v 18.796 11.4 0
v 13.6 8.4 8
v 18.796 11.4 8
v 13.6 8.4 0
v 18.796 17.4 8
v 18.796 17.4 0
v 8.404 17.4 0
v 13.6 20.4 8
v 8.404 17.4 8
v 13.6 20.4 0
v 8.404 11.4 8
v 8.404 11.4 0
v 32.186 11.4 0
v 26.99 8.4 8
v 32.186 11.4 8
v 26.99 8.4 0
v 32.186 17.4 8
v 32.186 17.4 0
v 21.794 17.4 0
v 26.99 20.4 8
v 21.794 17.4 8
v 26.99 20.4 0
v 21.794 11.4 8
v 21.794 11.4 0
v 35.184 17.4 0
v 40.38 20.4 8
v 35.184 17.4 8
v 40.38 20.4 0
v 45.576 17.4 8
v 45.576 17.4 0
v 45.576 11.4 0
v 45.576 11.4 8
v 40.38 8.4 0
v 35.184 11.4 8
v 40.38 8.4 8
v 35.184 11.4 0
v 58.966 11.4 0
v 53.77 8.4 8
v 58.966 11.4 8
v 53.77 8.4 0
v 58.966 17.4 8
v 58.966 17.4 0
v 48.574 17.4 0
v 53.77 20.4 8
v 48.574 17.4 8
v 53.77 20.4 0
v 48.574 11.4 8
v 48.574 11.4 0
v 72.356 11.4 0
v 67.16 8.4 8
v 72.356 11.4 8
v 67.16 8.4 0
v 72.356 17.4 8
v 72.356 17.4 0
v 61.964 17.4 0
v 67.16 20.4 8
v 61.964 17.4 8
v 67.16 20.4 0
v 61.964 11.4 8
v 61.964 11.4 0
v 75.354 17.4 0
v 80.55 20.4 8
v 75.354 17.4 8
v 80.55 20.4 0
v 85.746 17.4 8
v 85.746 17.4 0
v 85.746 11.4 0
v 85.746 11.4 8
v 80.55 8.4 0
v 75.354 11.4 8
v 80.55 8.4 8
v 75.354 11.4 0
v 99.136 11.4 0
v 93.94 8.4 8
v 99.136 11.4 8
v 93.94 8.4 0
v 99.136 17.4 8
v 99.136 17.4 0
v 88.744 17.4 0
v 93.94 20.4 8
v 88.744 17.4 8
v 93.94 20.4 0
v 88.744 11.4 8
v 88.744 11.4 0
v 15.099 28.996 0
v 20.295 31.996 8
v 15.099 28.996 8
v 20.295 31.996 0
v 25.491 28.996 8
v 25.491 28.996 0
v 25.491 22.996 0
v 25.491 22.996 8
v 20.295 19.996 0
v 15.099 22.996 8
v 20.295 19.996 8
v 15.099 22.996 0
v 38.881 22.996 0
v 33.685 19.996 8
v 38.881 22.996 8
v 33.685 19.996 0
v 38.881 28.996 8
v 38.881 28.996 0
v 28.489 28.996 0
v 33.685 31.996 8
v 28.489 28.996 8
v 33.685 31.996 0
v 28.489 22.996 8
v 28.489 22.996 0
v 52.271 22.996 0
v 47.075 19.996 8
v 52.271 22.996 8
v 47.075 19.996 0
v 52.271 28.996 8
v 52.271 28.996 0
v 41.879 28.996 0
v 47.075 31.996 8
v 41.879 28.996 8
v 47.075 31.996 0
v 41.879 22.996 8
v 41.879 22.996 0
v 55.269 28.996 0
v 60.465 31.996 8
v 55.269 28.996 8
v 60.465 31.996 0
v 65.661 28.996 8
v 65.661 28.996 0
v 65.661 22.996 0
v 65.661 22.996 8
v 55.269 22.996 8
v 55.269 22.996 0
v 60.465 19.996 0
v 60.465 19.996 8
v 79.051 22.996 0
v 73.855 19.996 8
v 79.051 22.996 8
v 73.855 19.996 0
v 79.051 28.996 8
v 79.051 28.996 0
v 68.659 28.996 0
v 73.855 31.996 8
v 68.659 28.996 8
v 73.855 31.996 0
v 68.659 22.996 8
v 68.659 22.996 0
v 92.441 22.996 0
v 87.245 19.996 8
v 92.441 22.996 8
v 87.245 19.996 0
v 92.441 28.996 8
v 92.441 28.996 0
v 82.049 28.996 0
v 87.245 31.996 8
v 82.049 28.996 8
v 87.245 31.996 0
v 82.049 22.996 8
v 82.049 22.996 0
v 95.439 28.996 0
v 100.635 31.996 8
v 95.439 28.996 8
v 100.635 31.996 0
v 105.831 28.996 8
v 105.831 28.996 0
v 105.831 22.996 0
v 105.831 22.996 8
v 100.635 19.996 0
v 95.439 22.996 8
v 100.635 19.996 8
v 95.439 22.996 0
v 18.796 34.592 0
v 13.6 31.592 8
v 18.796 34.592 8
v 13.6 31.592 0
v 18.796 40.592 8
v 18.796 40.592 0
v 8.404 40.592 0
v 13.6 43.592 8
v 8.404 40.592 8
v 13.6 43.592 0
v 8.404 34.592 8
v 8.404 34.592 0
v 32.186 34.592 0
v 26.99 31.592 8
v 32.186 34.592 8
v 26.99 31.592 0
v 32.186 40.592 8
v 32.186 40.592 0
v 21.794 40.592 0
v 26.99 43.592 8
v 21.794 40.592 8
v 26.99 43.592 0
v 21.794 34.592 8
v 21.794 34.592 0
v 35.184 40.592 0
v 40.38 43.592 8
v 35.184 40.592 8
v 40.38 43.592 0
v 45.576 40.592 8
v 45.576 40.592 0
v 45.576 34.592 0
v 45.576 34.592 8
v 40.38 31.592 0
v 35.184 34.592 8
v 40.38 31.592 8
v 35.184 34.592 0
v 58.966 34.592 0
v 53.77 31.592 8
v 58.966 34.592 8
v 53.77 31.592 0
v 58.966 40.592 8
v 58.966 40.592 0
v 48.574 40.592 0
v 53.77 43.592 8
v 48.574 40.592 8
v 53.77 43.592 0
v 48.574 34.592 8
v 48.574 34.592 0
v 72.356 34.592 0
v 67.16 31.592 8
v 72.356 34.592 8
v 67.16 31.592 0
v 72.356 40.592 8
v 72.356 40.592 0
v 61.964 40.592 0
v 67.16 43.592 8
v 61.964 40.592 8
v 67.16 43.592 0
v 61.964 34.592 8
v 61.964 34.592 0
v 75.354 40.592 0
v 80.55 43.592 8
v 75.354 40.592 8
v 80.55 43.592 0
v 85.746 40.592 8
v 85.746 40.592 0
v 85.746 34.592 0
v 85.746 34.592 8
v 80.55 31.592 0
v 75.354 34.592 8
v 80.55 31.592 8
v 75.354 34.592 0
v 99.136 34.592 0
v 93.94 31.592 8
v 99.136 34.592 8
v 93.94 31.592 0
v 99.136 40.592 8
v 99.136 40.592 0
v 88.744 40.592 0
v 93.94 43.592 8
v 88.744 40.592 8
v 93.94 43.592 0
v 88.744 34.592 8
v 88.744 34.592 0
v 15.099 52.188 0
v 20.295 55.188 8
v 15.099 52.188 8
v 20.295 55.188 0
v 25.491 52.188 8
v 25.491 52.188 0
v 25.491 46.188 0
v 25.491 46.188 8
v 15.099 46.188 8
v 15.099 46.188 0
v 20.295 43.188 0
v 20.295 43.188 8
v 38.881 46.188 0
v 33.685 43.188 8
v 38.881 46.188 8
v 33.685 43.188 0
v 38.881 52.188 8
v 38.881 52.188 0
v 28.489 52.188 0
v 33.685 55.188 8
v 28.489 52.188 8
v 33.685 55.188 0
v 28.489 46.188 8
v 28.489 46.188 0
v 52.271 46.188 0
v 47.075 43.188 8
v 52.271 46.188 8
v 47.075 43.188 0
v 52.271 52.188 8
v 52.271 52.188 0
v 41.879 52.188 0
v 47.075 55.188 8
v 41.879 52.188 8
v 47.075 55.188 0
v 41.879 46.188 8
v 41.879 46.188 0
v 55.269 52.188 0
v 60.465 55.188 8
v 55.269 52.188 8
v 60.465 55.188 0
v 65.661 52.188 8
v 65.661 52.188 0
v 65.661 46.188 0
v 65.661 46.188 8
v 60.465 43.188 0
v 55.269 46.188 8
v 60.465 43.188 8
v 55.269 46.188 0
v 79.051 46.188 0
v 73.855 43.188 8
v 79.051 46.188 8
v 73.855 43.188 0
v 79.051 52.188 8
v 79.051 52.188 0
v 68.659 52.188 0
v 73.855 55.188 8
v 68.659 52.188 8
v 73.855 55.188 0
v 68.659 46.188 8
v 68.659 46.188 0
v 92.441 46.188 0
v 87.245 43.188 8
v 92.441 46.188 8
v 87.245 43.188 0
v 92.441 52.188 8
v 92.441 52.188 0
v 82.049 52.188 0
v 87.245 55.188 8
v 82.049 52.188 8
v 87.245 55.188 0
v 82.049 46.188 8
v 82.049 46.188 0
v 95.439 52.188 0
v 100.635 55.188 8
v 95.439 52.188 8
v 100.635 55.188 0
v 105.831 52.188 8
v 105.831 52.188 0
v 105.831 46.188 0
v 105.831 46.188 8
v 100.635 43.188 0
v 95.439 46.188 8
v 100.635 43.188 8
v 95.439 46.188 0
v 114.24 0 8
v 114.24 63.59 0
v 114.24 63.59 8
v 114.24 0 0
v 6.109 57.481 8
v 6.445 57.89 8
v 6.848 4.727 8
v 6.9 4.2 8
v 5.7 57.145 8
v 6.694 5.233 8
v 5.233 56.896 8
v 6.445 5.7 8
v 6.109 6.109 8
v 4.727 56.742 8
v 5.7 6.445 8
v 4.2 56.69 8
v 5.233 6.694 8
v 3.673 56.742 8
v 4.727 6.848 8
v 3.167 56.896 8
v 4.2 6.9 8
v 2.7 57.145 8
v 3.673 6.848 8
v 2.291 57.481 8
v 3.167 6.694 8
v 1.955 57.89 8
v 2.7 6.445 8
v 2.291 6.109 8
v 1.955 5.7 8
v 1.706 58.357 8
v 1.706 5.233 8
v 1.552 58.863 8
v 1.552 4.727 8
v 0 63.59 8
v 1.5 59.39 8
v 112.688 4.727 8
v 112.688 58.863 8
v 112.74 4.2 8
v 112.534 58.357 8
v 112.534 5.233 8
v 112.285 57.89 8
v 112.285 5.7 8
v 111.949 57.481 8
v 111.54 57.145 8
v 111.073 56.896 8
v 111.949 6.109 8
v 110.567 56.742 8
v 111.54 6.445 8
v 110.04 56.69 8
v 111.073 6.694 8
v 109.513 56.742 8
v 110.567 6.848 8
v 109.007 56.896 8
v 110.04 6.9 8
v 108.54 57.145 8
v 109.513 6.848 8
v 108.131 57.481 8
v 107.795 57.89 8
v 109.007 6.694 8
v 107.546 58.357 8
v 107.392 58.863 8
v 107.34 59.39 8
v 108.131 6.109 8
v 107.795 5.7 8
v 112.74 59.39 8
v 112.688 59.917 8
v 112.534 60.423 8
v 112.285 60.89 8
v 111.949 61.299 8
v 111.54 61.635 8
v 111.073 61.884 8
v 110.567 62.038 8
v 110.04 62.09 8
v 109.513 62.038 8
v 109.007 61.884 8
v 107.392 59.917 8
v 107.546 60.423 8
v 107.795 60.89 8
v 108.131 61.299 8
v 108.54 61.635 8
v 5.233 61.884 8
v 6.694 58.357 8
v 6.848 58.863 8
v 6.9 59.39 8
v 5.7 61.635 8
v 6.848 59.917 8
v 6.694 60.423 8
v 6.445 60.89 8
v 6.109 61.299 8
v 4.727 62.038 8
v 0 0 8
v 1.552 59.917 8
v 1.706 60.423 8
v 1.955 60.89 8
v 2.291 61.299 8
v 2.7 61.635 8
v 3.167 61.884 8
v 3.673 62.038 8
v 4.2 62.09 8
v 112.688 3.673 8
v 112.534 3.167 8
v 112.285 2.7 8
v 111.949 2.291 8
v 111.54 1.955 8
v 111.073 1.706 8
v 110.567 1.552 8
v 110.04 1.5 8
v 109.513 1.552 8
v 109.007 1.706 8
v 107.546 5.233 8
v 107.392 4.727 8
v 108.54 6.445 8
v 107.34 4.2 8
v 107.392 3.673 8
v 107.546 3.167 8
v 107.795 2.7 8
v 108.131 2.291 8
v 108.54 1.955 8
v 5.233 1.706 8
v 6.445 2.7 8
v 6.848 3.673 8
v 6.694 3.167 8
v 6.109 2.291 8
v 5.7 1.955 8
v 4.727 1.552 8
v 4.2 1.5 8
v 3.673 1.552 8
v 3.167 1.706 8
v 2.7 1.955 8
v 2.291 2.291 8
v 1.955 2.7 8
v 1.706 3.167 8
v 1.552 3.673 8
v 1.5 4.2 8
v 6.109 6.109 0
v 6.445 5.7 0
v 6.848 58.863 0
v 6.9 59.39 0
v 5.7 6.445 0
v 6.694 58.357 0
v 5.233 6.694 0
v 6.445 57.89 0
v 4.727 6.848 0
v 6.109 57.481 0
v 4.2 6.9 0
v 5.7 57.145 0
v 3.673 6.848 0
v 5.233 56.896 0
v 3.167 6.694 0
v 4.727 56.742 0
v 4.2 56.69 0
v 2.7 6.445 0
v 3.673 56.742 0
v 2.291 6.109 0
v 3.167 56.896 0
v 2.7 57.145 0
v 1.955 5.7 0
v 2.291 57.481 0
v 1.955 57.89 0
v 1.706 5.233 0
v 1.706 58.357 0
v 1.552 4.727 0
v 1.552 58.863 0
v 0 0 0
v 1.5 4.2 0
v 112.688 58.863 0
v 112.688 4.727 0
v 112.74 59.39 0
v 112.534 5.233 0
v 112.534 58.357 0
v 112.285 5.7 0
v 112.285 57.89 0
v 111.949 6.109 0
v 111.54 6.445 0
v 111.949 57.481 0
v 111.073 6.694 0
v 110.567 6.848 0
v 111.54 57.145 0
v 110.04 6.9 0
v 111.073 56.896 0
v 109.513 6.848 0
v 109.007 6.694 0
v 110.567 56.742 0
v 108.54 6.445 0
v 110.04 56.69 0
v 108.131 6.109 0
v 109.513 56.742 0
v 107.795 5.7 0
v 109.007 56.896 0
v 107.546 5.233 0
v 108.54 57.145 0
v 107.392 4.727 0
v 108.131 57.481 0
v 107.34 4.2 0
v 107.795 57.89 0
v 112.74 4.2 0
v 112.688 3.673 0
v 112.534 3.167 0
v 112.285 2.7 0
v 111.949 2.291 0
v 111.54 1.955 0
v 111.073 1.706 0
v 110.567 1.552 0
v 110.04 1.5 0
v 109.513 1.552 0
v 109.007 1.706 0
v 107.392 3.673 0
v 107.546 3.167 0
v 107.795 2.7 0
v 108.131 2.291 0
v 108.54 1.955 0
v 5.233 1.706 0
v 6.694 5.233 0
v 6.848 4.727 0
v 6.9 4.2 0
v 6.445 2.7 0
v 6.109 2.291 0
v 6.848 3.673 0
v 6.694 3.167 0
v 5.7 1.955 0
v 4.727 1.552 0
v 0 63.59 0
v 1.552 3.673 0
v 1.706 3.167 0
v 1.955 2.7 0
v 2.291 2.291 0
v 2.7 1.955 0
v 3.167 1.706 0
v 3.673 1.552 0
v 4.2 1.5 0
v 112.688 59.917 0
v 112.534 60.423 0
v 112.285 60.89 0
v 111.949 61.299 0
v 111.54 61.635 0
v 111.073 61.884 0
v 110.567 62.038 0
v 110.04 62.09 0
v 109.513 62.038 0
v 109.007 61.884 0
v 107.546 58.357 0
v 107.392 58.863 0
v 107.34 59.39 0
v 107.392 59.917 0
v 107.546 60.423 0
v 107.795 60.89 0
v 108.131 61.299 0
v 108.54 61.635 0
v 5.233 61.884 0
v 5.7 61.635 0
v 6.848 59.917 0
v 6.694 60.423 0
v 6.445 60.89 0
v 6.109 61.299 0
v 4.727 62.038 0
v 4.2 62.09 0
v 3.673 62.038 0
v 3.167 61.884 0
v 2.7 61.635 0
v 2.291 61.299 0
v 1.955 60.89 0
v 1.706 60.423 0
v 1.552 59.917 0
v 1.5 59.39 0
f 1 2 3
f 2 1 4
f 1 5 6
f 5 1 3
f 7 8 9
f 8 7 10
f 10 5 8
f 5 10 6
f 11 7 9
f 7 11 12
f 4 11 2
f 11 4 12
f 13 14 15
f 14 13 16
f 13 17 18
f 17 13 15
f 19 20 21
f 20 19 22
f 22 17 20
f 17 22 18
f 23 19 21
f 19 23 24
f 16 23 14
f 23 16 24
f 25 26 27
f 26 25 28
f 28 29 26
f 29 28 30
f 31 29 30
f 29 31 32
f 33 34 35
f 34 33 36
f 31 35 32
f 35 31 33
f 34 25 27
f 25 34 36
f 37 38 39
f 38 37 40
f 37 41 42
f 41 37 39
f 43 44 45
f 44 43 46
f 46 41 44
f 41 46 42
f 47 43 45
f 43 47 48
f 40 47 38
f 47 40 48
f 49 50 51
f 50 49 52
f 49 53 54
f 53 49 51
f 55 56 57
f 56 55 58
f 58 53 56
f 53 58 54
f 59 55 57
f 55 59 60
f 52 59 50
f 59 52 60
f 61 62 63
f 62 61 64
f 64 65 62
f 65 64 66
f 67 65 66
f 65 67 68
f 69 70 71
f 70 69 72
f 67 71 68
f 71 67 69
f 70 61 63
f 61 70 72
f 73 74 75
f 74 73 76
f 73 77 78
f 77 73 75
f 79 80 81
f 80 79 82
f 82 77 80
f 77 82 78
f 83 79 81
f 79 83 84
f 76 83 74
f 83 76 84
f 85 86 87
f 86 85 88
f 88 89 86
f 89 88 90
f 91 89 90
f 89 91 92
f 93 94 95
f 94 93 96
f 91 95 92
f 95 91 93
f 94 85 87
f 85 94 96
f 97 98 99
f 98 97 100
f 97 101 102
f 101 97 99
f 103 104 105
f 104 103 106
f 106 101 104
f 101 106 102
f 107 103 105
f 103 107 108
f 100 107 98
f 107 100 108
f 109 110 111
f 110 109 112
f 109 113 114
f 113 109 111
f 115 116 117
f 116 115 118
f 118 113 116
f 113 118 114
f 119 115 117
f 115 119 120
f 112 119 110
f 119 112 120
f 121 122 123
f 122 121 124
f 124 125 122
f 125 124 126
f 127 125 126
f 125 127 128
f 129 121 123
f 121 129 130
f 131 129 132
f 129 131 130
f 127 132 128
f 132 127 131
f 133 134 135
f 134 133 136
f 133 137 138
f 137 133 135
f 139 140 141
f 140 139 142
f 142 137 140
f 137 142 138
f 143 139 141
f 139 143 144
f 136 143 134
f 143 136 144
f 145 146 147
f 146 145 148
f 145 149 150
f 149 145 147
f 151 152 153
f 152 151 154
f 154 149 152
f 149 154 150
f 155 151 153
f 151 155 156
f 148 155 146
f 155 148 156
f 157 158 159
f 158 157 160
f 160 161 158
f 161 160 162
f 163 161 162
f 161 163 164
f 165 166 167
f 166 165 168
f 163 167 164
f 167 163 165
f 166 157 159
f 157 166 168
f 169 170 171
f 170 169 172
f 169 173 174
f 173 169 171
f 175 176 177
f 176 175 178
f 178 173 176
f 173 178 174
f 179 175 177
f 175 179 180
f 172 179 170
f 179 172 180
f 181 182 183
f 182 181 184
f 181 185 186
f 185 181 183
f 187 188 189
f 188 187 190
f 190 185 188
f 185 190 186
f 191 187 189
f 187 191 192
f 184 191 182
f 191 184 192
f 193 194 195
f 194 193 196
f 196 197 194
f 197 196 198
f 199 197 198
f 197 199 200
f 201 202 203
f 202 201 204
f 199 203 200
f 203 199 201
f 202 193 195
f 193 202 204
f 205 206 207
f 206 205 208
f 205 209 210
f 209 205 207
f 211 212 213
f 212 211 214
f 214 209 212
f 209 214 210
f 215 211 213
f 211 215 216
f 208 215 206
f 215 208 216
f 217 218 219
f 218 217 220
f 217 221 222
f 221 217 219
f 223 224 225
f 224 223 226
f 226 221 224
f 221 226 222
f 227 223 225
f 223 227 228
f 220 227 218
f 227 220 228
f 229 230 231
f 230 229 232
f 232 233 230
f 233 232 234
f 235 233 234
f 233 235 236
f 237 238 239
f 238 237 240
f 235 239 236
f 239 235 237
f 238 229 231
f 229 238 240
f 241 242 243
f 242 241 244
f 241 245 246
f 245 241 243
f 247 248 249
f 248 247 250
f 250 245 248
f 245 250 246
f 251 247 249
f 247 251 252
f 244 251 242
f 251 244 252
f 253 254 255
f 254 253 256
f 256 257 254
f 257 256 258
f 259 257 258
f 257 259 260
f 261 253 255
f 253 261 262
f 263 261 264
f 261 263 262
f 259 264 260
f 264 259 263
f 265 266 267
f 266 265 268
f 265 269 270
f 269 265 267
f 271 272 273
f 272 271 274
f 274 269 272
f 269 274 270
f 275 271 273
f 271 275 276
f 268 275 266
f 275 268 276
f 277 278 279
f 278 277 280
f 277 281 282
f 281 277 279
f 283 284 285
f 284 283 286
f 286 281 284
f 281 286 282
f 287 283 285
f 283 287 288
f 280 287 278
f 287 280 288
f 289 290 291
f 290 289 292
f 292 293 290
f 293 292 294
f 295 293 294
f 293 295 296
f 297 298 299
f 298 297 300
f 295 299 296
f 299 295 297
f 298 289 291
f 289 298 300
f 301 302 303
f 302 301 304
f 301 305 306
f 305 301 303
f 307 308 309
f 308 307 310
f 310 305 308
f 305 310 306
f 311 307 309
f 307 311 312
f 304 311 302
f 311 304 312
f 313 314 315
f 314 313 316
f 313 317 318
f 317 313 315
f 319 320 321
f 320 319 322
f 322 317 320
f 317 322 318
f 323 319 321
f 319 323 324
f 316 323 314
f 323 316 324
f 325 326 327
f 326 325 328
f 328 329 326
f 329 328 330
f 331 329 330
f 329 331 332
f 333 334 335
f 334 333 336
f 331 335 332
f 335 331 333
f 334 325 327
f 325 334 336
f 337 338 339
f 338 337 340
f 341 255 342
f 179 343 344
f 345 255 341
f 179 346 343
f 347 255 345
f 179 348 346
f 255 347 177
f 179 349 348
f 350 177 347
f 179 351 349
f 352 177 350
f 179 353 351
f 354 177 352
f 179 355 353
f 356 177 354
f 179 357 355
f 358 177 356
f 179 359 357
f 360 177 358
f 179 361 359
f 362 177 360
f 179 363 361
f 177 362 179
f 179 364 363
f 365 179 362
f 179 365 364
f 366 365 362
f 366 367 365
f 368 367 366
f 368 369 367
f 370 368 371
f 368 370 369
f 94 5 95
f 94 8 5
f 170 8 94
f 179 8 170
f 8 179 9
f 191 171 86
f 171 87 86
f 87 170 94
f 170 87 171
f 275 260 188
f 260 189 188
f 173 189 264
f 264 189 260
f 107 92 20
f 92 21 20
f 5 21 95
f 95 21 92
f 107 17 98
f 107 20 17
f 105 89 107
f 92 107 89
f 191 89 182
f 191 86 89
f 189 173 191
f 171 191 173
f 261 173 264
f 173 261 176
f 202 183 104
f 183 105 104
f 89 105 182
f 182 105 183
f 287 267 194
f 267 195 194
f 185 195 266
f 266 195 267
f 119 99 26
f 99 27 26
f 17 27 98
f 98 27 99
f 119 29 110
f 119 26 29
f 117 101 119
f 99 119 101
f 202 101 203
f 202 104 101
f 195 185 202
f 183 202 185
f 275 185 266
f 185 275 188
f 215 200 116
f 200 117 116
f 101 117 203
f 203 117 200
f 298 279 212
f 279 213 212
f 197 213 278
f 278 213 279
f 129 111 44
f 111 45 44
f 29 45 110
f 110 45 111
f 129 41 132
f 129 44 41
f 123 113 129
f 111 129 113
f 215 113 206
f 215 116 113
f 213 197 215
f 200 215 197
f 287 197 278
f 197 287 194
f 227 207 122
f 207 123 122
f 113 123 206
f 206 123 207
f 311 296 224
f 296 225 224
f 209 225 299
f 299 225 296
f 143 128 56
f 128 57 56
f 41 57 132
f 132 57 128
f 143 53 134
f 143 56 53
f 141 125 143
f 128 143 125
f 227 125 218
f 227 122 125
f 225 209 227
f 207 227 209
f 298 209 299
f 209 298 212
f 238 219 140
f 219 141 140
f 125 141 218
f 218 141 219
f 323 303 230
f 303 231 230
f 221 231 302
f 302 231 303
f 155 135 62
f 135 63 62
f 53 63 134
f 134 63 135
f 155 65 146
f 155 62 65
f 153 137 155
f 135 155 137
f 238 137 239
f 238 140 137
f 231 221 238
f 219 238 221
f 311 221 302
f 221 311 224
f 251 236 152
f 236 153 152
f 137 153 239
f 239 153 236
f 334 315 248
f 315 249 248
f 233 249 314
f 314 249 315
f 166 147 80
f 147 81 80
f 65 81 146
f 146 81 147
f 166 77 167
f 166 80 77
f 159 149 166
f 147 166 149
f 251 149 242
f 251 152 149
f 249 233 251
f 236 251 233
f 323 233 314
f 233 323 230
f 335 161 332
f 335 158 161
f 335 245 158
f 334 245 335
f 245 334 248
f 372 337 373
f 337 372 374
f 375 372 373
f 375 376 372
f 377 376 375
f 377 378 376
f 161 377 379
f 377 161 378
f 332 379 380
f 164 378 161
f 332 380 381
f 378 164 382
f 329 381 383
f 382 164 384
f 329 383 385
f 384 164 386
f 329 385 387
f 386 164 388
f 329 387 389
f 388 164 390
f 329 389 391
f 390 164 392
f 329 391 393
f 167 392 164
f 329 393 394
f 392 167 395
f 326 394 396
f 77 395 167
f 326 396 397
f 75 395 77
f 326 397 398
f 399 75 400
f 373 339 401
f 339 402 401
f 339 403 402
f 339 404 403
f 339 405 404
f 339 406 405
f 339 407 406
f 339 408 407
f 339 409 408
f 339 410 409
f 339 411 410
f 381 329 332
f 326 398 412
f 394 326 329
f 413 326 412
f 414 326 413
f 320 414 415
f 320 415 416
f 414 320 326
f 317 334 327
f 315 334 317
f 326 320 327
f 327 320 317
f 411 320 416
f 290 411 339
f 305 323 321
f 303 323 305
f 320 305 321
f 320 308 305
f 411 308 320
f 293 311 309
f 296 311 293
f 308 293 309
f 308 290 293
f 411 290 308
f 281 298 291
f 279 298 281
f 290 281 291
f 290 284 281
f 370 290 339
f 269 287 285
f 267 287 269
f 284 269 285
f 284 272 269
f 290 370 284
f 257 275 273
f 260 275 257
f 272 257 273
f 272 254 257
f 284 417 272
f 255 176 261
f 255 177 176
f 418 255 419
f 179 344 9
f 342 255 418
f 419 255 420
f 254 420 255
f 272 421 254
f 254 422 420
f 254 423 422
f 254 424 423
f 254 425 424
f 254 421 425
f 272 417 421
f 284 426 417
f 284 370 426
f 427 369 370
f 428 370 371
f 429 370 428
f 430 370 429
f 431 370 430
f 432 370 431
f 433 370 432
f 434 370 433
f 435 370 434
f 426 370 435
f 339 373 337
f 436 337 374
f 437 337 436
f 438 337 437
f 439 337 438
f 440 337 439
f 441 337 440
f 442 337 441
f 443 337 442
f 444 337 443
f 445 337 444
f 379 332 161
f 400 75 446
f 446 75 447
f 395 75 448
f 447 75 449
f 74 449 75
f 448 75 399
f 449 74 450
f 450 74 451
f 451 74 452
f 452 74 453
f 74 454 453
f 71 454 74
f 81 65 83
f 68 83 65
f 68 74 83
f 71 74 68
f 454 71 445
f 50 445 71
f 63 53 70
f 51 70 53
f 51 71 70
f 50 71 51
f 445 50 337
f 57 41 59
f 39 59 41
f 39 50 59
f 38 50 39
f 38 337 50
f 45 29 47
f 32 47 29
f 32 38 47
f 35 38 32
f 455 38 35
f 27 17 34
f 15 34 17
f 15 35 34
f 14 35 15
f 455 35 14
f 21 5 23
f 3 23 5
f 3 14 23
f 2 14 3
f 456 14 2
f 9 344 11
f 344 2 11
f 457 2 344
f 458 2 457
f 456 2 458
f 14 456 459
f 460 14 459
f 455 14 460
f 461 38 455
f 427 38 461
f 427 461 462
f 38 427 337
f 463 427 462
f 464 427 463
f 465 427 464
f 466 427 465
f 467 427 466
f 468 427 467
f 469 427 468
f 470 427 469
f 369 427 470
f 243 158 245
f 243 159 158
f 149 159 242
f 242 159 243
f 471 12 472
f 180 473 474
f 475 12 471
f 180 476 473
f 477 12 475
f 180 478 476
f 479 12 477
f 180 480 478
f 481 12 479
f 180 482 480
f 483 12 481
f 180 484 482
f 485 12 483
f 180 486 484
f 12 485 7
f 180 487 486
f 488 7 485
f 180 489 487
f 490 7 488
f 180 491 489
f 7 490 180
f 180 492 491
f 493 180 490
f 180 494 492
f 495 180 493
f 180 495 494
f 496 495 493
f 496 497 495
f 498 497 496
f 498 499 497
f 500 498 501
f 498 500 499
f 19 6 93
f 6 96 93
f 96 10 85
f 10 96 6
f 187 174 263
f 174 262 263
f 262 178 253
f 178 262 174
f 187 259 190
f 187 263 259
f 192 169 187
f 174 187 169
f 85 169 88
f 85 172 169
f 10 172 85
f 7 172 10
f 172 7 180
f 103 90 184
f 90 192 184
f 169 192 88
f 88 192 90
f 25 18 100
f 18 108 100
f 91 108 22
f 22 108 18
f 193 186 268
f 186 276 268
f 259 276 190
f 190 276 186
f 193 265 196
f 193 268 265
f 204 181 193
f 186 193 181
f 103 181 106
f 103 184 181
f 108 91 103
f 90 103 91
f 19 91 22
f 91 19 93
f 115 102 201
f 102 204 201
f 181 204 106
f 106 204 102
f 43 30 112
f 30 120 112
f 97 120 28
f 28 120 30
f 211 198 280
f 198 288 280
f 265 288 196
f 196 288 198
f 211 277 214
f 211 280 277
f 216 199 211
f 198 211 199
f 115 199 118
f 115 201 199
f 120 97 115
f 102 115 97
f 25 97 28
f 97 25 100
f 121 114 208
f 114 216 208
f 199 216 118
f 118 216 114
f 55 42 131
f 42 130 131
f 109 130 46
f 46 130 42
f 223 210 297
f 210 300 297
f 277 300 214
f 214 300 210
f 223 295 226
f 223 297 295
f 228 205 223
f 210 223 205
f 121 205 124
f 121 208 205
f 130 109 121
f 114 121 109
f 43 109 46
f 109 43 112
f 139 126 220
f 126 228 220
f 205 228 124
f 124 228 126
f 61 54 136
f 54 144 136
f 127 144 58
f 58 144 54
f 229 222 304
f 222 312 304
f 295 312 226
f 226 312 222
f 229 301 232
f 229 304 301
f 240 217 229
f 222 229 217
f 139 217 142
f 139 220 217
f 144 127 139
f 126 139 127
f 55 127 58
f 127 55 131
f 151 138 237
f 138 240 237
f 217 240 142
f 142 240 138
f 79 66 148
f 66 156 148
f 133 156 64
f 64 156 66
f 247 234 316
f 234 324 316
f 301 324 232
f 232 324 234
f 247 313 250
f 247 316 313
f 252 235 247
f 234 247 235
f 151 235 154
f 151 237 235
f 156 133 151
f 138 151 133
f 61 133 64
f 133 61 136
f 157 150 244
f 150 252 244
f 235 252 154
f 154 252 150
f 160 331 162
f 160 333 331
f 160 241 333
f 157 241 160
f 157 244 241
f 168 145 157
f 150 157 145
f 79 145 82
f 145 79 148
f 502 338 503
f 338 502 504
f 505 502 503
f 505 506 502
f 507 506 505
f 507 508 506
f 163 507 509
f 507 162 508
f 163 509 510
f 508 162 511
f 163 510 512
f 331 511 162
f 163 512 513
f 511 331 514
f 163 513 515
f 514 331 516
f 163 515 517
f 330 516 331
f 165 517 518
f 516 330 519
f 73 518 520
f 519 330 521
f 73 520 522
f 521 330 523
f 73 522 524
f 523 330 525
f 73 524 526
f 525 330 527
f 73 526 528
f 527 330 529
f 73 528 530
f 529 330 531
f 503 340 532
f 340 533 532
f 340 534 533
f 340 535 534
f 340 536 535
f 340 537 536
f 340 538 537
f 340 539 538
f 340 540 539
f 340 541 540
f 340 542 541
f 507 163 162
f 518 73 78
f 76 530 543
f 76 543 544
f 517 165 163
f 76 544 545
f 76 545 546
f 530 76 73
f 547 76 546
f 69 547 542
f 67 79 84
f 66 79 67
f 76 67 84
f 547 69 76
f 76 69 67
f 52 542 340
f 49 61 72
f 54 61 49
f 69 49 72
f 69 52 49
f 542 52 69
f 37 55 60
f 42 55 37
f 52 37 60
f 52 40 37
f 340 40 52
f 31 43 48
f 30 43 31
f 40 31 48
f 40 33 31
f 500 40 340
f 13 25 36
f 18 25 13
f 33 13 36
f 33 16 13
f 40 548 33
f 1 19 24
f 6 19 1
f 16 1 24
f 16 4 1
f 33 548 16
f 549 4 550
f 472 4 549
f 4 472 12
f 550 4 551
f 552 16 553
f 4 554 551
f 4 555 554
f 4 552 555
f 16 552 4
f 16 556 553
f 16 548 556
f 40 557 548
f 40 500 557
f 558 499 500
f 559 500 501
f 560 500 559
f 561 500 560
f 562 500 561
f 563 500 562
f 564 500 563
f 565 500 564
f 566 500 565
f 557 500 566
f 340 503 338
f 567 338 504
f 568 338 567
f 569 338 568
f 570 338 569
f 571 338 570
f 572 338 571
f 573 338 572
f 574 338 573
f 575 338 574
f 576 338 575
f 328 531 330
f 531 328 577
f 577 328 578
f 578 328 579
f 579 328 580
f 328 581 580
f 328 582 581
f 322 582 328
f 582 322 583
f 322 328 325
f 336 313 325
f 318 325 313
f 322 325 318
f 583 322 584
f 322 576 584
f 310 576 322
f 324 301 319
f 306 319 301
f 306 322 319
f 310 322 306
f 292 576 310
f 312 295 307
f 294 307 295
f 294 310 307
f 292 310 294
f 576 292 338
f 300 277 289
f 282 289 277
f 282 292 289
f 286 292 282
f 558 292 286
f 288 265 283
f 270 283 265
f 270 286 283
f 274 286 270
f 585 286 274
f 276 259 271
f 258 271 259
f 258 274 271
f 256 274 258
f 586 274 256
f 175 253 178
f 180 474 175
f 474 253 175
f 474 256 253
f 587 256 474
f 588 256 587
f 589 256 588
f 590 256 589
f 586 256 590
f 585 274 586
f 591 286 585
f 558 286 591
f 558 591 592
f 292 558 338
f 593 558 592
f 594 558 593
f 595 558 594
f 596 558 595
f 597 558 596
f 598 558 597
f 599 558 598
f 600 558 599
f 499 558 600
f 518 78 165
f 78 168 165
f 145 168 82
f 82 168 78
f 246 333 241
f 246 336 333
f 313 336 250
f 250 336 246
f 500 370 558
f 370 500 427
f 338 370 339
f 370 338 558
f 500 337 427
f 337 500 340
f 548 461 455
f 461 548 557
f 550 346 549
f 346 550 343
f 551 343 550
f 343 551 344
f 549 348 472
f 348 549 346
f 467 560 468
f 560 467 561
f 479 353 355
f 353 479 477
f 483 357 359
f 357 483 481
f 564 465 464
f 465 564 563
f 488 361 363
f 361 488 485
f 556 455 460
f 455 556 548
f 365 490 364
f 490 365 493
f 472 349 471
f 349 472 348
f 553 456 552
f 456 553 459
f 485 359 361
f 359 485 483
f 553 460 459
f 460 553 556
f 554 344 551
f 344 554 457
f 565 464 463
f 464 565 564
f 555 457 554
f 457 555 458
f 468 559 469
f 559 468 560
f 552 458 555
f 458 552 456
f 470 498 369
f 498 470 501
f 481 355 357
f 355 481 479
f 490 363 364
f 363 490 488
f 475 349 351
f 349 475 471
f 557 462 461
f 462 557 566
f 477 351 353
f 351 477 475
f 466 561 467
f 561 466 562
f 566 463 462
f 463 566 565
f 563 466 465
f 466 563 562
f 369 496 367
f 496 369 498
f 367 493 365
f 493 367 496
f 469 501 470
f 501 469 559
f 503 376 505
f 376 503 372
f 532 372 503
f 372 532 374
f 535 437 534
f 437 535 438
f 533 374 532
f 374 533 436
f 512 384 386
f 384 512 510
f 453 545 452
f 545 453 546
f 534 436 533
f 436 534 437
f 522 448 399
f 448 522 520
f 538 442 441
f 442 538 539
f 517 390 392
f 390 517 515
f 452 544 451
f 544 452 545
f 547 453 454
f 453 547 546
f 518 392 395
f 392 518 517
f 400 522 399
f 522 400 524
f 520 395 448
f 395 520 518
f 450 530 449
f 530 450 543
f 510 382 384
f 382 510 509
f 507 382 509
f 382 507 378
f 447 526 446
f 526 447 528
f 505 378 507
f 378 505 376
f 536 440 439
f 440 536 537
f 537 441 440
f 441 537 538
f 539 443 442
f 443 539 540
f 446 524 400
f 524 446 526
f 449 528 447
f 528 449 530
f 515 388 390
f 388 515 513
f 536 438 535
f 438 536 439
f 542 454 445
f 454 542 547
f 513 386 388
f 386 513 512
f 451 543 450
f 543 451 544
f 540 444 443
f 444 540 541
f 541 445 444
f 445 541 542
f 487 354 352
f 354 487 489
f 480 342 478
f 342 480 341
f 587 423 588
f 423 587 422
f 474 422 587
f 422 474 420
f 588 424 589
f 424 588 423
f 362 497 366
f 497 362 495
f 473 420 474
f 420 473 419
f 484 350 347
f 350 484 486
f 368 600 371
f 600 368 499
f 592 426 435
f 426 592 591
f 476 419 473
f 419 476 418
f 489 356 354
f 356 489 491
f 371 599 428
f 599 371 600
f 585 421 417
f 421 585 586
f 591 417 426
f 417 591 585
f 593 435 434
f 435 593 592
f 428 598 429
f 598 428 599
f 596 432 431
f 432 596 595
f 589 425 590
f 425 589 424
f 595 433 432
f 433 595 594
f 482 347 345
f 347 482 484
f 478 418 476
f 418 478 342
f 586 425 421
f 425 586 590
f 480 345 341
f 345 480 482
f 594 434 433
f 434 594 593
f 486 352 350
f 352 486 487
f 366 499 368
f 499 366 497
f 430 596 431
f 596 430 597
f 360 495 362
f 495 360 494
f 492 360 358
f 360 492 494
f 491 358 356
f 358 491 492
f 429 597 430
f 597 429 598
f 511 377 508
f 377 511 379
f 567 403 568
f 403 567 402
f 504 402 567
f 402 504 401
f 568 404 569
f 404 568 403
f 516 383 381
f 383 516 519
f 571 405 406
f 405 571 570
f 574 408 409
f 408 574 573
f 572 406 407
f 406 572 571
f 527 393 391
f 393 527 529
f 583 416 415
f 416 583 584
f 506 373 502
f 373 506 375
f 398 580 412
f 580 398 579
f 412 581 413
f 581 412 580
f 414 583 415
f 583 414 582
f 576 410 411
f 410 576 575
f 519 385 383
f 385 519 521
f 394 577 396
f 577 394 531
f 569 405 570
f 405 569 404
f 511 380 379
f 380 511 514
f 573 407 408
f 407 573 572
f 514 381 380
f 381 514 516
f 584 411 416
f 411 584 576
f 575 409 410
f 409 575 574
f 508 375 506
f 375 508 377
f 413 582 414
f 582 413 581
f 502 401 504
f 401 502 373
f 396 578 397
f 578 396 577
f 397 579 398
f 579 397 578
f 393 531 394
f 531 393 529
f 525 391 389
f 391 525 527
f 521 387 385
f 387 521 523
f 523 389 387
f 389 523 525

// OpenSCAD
$fn = 32;

// ----------------------------------------------------------------------
// Honeycomb panel: 114.24 x 63.59 mm, 28 cells of 12 mm
// ----------------------------------------------------------------------

// --- parameters (mm) ---
panel_w = 114.24;         // panel width
panel_d = 63.59;          // panel depth
thick = 8;                // panel thickness
cell_r = 6;               // hex cell circumradius
pitch = 13.39;            // hex cell pitch (centre to centre)
web = 3;                  // web between the cells
columns = 7;              // columns of cells
rows = 4;                 // rows of cells
cell_count = 28;          // total cells
shift_x = 13.6;           // first cell offset in x
shift_y = 14.4;           // first cell offset in y
mount_d = 5.4;            // corner mounting holes
hole_off = 4.2;           // mounting hole offset from the corners

difference() {
  union() {
    cube([panel_w, panel_d, thick]);
  }
  /* hexagonal cells, point-up, cut right through the plate */
  for (row = [0 : rows - 1]) {
    for (col = [0 : columns - 1]) {
      translate([shift_x + col * pitch + (row % 2) * pitch / 2, shift_y + row * pitch * 0.866025, -2.5]) rotate([0, 0, 30]) cylinder(h = thick + 5, d = 2 * cell_r, $fn = 6);
    }
  }
  /* corner mounting holes, clear of the outer cell web */
  translate([4.2, 4.2, -2.5]) cylinder(h = thick + 5, d = mount_d);
  translate([110.04, 4.2, -2.5]) cylinder(h = thick + 5, d = mount_d);
  translate([4.2, 59.39, -2.5]) cylinder(h = thick + 5, d = mount_d);
  translate([110.04, 59.39, -2.5]) cylinder(h = thick + 5, d = mount_d);
}
